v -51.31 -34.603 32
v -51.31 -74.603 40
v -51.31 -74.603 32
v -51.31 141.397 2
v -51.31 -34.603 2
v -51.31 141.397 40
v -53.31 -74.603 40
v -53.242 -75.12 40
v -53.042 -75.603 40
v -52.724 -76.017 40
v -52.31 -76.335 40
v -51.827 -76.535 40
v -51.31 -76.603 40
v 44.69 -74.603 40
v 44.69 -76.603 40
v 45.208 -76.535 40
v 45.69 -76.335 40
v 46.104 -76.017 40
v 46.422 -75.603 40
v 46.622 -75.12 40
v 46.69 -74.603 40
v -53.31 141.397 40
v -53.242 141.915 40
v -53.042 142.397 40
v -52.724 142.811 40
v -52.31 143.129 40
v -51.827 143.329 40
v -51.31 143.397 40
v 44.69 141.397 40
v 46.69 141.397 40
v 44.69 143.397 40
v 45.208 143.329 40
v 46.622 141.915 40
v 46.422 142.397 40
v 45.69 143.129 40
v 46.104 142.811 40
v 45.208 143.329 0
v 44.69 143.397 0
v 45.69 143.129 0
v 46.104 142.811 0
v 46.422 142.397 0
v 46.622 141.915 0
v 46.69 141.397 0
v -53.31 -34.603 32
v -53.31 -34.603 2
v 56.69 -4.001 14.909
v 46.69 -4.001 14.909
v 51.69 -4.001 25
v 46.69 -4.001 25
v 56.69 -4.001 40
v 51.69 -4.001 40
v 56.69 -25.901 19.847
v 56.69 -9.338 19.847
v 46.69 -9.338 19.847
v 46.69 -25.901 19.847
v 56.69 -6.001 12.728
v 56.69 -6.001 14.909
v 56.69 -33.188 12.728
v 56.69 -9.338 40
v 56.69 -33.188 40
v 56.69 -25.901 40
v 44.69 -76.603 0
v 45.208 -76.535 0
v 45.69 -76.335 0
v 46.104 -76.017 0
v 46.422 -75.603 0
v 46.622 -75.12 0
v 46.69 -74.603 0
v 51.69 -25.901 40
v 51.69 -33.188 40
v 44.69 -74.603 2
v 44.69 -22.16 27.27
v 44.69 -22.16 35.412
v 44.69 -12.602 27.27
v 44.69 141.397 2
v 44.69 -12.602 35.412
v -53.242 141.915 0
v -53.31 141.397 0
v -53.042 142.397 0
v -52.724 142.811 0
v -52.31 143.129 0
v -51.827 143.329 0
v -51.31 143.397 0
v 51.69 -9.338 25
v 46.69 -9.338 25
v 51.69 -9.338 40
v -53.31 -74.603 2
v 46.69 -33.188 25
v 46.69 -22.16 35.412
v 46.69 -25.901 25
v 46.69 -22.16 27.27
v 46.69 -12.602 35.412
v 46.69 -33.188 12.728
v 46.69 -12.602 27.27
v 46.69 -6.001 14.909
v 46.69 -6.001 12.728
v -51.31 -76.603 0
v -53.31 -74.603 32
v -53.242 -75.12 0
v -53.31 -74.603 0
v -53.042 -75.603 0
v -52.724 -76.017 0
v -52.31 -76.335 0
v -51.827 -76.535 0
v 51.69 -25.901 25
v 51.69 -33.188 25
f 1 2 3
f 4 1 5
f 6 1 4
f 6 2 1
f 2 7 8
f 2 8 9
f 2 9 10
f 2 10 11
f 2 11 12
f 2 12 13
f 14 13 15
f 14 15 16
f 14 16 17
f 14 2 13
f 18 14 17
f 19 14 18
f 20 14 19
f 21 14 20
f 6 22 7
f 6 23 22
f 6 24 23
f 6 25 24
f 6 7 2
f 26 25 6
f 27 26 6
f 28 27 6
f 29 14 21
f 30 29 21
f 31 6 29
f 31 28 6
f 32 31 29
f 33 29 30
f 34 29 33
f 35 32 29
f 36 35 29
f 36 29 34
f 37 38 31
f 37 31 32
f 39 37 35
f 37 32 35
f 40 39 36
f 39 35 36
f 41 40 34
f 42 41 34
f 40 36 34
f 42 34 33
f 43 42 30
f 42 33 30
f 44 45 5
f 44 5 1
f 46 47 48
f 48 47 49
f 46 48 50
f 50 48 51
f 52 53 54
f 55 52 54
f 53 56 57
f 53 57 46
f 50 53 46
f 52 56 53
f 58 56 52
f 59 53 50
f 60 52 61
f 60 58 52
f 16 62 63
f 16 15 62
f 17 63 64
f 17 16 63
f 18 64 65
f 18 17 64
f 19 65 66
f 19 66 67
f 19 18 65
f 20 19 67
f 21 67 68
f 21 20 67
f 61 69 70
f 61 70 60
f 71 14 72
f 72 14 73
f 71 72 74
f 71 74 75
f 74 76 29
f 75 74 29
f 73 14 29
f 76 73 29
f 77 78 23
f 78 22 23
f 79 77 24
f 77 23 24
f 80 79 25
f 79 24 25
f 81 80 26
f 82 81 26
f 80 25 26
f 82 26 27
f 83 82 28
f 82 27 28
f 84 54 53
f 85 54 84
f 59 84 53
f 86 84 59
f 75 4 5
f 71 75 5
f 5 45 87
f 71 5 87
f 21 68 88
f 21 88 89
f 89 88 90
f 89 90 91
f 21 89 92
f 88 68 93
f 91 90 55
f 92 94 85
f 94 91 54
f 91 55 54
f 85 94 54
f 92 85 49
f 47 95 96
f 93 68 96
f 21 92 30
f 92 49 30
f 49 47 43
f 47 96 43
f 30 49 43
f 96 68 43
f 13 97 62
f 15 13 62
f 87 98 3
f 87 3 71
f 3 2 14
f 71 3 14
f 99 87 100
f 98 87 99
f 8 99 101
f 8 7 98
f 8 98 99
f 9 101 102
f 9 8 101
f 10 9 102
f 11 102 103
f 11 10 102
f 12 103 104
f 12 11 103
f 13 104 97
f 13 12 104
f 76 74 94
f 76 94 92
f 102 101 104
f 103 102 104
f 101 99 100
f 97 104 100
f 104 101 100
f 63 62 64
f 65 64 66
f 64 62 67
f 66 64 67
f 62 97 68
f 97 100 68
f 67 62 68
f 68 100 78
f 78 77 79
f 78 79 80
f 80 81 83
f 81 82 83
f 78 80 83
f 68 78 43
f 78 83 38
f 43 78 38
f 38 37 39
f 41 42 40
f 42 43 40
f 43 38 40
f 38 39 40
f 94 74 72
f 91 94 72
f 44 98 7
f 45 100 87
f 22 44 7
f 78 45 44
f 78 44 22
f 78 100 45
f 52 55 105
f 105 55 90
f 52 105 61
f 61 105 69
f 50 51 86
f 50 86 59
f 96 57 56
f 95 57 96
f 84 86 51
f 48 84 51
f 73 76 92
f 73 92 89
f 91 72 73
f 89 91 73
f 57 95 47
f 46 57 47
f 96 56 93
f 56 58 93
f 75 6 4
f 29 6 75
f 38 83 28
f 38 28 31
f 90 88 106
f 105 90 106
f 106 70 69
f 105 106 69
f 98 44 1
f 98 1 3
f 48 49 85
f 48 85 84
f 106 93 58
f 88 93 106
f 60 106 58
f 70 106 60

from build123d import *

# Parameters (mm, degrees)
F0_W      = 100
F0_H      = 220
F1_DEPTH  = 40
F2_W      = 96
F2_H      = 216
F3_DEPTH  = 38
F5_R      = 2
F4_W      = 40
F4_H      = 30
F6_DEPTH  = 2
F8_W      = 5.3375530988
F8_H      = 25.0908638909
F9_DEPTH  = 10
F10_W     = 7.2876084596
F10_H     = 27.2723501176
F11_DEPTH = 10
F12_W     = 10
F12_H     = 7.1194600314
F13_DEPTH = 19.9
F14_W     = 9.5573319122
F14_H     = 8.1418789923
F15_DEPTH = 25
F16_W     = 5
F16_H     = 7.2876084596
F16_H_2   = 5.3375530988
F17_DEPTH = 15


with BuildPart() as f1:
    # F0 (on Top) → F1 (new body)
    with BuildSketch(Plane.XY):
        with Locations((-3.3097676933, 33.3972522417)):
            Rectangle(F0_W, F0_H)
    extrude(amount=F1_DEPTH)

    # F2 (on face) → F3 (cut)
    with BuildSketch(Plane.XY.offset(40)):
        with Locations((-3.3097676933, 33.3972522417)):
            Rectangle(F2_W, F2_H)
    extrude(amount=-F3_DEPTH, mode=Mode.SUBTRACT)

    # F5
    f5_edges = [f1.edges().sort_by_distance(p)[0] for p in [
        (-53.309768, -76.602748, 20),
        (46.690232, -76.602748, 20),
        (-53.309768, 143.397252, 20),
        (46.690232, 143.397252, 20),
    ]]
    fillet(f5_edges, radius=F5_R)

    # F4 (on face) → F6 (cut)
    with BuildSketch(Plane(origin=(-53.3097676933, 0, 0), x_dir=(0, -1, 0), z_dir=(-1, 0, 0))):
        with Locations((54.6027477583, 17)):
            Rectangle(F4_W, F4_H)
    extrude(amount=-F6_DEPTH, mode=Mode.SUBTRACT)

    # F8 (on face) → F9 (join)
    with BuildSketch(Plane.YZ.offset(46.6902323067)):
        with Locations((-6.6695250571, 27.4545680545)):
            Rectangle(F8_W, F8_H)
    extrude(amount=F9_DEPTH)

    # F10 (on face) → F11 (join)
    with BuildSketch(Plane.YZ.offset(46.6902323067)):
        with Locations((-29.5446543023, 26.3638249412)):
            Rectangle(F10_W, F10_H)
    extrude(amount=F11_DEPTH)

    # F12 (on face) → F13 (join)
    with BuildSketch(Plane(origin=(0, -25.9008500725, 0), x_dir=(-1, 0, 0), z_dir=(0, 1, 0))):
        with Locations((-51.6902323067, 16.2873798981)):
            Rectangle(F12_W, F12_H)
    extrude(amount=F13_DEPTH)

    # F14 (on face) → F15 (cut)
    with BuildSketch(Plane(origin=(44.6902323067, 0, 0), x_dir=(0, -1, 0), z_dir=(-1, 0, 0))):
        with Locations((17.3811190762, 31.3413348049)):
            Rectangle(F14_W, F14_H)
    extrude(amount=-F15_DEPTH, mode=Mode.SUBTRACT)

    # F16 (on face) → F17 (cut)
    with BuildSketch(Plane.XY.offset(40)):
        with Locations((49.1902323067, -29.5446543023)):
            Rectangle(F16_W, F16_H)
        with Locations((49.1902323067, -6.6695250571)):
            Rectangle(F16_W, F16_H_2)
    extrude(amount=-F17_DEPTH, mode=Mode.SUBTRACT)


solid = f1.part
